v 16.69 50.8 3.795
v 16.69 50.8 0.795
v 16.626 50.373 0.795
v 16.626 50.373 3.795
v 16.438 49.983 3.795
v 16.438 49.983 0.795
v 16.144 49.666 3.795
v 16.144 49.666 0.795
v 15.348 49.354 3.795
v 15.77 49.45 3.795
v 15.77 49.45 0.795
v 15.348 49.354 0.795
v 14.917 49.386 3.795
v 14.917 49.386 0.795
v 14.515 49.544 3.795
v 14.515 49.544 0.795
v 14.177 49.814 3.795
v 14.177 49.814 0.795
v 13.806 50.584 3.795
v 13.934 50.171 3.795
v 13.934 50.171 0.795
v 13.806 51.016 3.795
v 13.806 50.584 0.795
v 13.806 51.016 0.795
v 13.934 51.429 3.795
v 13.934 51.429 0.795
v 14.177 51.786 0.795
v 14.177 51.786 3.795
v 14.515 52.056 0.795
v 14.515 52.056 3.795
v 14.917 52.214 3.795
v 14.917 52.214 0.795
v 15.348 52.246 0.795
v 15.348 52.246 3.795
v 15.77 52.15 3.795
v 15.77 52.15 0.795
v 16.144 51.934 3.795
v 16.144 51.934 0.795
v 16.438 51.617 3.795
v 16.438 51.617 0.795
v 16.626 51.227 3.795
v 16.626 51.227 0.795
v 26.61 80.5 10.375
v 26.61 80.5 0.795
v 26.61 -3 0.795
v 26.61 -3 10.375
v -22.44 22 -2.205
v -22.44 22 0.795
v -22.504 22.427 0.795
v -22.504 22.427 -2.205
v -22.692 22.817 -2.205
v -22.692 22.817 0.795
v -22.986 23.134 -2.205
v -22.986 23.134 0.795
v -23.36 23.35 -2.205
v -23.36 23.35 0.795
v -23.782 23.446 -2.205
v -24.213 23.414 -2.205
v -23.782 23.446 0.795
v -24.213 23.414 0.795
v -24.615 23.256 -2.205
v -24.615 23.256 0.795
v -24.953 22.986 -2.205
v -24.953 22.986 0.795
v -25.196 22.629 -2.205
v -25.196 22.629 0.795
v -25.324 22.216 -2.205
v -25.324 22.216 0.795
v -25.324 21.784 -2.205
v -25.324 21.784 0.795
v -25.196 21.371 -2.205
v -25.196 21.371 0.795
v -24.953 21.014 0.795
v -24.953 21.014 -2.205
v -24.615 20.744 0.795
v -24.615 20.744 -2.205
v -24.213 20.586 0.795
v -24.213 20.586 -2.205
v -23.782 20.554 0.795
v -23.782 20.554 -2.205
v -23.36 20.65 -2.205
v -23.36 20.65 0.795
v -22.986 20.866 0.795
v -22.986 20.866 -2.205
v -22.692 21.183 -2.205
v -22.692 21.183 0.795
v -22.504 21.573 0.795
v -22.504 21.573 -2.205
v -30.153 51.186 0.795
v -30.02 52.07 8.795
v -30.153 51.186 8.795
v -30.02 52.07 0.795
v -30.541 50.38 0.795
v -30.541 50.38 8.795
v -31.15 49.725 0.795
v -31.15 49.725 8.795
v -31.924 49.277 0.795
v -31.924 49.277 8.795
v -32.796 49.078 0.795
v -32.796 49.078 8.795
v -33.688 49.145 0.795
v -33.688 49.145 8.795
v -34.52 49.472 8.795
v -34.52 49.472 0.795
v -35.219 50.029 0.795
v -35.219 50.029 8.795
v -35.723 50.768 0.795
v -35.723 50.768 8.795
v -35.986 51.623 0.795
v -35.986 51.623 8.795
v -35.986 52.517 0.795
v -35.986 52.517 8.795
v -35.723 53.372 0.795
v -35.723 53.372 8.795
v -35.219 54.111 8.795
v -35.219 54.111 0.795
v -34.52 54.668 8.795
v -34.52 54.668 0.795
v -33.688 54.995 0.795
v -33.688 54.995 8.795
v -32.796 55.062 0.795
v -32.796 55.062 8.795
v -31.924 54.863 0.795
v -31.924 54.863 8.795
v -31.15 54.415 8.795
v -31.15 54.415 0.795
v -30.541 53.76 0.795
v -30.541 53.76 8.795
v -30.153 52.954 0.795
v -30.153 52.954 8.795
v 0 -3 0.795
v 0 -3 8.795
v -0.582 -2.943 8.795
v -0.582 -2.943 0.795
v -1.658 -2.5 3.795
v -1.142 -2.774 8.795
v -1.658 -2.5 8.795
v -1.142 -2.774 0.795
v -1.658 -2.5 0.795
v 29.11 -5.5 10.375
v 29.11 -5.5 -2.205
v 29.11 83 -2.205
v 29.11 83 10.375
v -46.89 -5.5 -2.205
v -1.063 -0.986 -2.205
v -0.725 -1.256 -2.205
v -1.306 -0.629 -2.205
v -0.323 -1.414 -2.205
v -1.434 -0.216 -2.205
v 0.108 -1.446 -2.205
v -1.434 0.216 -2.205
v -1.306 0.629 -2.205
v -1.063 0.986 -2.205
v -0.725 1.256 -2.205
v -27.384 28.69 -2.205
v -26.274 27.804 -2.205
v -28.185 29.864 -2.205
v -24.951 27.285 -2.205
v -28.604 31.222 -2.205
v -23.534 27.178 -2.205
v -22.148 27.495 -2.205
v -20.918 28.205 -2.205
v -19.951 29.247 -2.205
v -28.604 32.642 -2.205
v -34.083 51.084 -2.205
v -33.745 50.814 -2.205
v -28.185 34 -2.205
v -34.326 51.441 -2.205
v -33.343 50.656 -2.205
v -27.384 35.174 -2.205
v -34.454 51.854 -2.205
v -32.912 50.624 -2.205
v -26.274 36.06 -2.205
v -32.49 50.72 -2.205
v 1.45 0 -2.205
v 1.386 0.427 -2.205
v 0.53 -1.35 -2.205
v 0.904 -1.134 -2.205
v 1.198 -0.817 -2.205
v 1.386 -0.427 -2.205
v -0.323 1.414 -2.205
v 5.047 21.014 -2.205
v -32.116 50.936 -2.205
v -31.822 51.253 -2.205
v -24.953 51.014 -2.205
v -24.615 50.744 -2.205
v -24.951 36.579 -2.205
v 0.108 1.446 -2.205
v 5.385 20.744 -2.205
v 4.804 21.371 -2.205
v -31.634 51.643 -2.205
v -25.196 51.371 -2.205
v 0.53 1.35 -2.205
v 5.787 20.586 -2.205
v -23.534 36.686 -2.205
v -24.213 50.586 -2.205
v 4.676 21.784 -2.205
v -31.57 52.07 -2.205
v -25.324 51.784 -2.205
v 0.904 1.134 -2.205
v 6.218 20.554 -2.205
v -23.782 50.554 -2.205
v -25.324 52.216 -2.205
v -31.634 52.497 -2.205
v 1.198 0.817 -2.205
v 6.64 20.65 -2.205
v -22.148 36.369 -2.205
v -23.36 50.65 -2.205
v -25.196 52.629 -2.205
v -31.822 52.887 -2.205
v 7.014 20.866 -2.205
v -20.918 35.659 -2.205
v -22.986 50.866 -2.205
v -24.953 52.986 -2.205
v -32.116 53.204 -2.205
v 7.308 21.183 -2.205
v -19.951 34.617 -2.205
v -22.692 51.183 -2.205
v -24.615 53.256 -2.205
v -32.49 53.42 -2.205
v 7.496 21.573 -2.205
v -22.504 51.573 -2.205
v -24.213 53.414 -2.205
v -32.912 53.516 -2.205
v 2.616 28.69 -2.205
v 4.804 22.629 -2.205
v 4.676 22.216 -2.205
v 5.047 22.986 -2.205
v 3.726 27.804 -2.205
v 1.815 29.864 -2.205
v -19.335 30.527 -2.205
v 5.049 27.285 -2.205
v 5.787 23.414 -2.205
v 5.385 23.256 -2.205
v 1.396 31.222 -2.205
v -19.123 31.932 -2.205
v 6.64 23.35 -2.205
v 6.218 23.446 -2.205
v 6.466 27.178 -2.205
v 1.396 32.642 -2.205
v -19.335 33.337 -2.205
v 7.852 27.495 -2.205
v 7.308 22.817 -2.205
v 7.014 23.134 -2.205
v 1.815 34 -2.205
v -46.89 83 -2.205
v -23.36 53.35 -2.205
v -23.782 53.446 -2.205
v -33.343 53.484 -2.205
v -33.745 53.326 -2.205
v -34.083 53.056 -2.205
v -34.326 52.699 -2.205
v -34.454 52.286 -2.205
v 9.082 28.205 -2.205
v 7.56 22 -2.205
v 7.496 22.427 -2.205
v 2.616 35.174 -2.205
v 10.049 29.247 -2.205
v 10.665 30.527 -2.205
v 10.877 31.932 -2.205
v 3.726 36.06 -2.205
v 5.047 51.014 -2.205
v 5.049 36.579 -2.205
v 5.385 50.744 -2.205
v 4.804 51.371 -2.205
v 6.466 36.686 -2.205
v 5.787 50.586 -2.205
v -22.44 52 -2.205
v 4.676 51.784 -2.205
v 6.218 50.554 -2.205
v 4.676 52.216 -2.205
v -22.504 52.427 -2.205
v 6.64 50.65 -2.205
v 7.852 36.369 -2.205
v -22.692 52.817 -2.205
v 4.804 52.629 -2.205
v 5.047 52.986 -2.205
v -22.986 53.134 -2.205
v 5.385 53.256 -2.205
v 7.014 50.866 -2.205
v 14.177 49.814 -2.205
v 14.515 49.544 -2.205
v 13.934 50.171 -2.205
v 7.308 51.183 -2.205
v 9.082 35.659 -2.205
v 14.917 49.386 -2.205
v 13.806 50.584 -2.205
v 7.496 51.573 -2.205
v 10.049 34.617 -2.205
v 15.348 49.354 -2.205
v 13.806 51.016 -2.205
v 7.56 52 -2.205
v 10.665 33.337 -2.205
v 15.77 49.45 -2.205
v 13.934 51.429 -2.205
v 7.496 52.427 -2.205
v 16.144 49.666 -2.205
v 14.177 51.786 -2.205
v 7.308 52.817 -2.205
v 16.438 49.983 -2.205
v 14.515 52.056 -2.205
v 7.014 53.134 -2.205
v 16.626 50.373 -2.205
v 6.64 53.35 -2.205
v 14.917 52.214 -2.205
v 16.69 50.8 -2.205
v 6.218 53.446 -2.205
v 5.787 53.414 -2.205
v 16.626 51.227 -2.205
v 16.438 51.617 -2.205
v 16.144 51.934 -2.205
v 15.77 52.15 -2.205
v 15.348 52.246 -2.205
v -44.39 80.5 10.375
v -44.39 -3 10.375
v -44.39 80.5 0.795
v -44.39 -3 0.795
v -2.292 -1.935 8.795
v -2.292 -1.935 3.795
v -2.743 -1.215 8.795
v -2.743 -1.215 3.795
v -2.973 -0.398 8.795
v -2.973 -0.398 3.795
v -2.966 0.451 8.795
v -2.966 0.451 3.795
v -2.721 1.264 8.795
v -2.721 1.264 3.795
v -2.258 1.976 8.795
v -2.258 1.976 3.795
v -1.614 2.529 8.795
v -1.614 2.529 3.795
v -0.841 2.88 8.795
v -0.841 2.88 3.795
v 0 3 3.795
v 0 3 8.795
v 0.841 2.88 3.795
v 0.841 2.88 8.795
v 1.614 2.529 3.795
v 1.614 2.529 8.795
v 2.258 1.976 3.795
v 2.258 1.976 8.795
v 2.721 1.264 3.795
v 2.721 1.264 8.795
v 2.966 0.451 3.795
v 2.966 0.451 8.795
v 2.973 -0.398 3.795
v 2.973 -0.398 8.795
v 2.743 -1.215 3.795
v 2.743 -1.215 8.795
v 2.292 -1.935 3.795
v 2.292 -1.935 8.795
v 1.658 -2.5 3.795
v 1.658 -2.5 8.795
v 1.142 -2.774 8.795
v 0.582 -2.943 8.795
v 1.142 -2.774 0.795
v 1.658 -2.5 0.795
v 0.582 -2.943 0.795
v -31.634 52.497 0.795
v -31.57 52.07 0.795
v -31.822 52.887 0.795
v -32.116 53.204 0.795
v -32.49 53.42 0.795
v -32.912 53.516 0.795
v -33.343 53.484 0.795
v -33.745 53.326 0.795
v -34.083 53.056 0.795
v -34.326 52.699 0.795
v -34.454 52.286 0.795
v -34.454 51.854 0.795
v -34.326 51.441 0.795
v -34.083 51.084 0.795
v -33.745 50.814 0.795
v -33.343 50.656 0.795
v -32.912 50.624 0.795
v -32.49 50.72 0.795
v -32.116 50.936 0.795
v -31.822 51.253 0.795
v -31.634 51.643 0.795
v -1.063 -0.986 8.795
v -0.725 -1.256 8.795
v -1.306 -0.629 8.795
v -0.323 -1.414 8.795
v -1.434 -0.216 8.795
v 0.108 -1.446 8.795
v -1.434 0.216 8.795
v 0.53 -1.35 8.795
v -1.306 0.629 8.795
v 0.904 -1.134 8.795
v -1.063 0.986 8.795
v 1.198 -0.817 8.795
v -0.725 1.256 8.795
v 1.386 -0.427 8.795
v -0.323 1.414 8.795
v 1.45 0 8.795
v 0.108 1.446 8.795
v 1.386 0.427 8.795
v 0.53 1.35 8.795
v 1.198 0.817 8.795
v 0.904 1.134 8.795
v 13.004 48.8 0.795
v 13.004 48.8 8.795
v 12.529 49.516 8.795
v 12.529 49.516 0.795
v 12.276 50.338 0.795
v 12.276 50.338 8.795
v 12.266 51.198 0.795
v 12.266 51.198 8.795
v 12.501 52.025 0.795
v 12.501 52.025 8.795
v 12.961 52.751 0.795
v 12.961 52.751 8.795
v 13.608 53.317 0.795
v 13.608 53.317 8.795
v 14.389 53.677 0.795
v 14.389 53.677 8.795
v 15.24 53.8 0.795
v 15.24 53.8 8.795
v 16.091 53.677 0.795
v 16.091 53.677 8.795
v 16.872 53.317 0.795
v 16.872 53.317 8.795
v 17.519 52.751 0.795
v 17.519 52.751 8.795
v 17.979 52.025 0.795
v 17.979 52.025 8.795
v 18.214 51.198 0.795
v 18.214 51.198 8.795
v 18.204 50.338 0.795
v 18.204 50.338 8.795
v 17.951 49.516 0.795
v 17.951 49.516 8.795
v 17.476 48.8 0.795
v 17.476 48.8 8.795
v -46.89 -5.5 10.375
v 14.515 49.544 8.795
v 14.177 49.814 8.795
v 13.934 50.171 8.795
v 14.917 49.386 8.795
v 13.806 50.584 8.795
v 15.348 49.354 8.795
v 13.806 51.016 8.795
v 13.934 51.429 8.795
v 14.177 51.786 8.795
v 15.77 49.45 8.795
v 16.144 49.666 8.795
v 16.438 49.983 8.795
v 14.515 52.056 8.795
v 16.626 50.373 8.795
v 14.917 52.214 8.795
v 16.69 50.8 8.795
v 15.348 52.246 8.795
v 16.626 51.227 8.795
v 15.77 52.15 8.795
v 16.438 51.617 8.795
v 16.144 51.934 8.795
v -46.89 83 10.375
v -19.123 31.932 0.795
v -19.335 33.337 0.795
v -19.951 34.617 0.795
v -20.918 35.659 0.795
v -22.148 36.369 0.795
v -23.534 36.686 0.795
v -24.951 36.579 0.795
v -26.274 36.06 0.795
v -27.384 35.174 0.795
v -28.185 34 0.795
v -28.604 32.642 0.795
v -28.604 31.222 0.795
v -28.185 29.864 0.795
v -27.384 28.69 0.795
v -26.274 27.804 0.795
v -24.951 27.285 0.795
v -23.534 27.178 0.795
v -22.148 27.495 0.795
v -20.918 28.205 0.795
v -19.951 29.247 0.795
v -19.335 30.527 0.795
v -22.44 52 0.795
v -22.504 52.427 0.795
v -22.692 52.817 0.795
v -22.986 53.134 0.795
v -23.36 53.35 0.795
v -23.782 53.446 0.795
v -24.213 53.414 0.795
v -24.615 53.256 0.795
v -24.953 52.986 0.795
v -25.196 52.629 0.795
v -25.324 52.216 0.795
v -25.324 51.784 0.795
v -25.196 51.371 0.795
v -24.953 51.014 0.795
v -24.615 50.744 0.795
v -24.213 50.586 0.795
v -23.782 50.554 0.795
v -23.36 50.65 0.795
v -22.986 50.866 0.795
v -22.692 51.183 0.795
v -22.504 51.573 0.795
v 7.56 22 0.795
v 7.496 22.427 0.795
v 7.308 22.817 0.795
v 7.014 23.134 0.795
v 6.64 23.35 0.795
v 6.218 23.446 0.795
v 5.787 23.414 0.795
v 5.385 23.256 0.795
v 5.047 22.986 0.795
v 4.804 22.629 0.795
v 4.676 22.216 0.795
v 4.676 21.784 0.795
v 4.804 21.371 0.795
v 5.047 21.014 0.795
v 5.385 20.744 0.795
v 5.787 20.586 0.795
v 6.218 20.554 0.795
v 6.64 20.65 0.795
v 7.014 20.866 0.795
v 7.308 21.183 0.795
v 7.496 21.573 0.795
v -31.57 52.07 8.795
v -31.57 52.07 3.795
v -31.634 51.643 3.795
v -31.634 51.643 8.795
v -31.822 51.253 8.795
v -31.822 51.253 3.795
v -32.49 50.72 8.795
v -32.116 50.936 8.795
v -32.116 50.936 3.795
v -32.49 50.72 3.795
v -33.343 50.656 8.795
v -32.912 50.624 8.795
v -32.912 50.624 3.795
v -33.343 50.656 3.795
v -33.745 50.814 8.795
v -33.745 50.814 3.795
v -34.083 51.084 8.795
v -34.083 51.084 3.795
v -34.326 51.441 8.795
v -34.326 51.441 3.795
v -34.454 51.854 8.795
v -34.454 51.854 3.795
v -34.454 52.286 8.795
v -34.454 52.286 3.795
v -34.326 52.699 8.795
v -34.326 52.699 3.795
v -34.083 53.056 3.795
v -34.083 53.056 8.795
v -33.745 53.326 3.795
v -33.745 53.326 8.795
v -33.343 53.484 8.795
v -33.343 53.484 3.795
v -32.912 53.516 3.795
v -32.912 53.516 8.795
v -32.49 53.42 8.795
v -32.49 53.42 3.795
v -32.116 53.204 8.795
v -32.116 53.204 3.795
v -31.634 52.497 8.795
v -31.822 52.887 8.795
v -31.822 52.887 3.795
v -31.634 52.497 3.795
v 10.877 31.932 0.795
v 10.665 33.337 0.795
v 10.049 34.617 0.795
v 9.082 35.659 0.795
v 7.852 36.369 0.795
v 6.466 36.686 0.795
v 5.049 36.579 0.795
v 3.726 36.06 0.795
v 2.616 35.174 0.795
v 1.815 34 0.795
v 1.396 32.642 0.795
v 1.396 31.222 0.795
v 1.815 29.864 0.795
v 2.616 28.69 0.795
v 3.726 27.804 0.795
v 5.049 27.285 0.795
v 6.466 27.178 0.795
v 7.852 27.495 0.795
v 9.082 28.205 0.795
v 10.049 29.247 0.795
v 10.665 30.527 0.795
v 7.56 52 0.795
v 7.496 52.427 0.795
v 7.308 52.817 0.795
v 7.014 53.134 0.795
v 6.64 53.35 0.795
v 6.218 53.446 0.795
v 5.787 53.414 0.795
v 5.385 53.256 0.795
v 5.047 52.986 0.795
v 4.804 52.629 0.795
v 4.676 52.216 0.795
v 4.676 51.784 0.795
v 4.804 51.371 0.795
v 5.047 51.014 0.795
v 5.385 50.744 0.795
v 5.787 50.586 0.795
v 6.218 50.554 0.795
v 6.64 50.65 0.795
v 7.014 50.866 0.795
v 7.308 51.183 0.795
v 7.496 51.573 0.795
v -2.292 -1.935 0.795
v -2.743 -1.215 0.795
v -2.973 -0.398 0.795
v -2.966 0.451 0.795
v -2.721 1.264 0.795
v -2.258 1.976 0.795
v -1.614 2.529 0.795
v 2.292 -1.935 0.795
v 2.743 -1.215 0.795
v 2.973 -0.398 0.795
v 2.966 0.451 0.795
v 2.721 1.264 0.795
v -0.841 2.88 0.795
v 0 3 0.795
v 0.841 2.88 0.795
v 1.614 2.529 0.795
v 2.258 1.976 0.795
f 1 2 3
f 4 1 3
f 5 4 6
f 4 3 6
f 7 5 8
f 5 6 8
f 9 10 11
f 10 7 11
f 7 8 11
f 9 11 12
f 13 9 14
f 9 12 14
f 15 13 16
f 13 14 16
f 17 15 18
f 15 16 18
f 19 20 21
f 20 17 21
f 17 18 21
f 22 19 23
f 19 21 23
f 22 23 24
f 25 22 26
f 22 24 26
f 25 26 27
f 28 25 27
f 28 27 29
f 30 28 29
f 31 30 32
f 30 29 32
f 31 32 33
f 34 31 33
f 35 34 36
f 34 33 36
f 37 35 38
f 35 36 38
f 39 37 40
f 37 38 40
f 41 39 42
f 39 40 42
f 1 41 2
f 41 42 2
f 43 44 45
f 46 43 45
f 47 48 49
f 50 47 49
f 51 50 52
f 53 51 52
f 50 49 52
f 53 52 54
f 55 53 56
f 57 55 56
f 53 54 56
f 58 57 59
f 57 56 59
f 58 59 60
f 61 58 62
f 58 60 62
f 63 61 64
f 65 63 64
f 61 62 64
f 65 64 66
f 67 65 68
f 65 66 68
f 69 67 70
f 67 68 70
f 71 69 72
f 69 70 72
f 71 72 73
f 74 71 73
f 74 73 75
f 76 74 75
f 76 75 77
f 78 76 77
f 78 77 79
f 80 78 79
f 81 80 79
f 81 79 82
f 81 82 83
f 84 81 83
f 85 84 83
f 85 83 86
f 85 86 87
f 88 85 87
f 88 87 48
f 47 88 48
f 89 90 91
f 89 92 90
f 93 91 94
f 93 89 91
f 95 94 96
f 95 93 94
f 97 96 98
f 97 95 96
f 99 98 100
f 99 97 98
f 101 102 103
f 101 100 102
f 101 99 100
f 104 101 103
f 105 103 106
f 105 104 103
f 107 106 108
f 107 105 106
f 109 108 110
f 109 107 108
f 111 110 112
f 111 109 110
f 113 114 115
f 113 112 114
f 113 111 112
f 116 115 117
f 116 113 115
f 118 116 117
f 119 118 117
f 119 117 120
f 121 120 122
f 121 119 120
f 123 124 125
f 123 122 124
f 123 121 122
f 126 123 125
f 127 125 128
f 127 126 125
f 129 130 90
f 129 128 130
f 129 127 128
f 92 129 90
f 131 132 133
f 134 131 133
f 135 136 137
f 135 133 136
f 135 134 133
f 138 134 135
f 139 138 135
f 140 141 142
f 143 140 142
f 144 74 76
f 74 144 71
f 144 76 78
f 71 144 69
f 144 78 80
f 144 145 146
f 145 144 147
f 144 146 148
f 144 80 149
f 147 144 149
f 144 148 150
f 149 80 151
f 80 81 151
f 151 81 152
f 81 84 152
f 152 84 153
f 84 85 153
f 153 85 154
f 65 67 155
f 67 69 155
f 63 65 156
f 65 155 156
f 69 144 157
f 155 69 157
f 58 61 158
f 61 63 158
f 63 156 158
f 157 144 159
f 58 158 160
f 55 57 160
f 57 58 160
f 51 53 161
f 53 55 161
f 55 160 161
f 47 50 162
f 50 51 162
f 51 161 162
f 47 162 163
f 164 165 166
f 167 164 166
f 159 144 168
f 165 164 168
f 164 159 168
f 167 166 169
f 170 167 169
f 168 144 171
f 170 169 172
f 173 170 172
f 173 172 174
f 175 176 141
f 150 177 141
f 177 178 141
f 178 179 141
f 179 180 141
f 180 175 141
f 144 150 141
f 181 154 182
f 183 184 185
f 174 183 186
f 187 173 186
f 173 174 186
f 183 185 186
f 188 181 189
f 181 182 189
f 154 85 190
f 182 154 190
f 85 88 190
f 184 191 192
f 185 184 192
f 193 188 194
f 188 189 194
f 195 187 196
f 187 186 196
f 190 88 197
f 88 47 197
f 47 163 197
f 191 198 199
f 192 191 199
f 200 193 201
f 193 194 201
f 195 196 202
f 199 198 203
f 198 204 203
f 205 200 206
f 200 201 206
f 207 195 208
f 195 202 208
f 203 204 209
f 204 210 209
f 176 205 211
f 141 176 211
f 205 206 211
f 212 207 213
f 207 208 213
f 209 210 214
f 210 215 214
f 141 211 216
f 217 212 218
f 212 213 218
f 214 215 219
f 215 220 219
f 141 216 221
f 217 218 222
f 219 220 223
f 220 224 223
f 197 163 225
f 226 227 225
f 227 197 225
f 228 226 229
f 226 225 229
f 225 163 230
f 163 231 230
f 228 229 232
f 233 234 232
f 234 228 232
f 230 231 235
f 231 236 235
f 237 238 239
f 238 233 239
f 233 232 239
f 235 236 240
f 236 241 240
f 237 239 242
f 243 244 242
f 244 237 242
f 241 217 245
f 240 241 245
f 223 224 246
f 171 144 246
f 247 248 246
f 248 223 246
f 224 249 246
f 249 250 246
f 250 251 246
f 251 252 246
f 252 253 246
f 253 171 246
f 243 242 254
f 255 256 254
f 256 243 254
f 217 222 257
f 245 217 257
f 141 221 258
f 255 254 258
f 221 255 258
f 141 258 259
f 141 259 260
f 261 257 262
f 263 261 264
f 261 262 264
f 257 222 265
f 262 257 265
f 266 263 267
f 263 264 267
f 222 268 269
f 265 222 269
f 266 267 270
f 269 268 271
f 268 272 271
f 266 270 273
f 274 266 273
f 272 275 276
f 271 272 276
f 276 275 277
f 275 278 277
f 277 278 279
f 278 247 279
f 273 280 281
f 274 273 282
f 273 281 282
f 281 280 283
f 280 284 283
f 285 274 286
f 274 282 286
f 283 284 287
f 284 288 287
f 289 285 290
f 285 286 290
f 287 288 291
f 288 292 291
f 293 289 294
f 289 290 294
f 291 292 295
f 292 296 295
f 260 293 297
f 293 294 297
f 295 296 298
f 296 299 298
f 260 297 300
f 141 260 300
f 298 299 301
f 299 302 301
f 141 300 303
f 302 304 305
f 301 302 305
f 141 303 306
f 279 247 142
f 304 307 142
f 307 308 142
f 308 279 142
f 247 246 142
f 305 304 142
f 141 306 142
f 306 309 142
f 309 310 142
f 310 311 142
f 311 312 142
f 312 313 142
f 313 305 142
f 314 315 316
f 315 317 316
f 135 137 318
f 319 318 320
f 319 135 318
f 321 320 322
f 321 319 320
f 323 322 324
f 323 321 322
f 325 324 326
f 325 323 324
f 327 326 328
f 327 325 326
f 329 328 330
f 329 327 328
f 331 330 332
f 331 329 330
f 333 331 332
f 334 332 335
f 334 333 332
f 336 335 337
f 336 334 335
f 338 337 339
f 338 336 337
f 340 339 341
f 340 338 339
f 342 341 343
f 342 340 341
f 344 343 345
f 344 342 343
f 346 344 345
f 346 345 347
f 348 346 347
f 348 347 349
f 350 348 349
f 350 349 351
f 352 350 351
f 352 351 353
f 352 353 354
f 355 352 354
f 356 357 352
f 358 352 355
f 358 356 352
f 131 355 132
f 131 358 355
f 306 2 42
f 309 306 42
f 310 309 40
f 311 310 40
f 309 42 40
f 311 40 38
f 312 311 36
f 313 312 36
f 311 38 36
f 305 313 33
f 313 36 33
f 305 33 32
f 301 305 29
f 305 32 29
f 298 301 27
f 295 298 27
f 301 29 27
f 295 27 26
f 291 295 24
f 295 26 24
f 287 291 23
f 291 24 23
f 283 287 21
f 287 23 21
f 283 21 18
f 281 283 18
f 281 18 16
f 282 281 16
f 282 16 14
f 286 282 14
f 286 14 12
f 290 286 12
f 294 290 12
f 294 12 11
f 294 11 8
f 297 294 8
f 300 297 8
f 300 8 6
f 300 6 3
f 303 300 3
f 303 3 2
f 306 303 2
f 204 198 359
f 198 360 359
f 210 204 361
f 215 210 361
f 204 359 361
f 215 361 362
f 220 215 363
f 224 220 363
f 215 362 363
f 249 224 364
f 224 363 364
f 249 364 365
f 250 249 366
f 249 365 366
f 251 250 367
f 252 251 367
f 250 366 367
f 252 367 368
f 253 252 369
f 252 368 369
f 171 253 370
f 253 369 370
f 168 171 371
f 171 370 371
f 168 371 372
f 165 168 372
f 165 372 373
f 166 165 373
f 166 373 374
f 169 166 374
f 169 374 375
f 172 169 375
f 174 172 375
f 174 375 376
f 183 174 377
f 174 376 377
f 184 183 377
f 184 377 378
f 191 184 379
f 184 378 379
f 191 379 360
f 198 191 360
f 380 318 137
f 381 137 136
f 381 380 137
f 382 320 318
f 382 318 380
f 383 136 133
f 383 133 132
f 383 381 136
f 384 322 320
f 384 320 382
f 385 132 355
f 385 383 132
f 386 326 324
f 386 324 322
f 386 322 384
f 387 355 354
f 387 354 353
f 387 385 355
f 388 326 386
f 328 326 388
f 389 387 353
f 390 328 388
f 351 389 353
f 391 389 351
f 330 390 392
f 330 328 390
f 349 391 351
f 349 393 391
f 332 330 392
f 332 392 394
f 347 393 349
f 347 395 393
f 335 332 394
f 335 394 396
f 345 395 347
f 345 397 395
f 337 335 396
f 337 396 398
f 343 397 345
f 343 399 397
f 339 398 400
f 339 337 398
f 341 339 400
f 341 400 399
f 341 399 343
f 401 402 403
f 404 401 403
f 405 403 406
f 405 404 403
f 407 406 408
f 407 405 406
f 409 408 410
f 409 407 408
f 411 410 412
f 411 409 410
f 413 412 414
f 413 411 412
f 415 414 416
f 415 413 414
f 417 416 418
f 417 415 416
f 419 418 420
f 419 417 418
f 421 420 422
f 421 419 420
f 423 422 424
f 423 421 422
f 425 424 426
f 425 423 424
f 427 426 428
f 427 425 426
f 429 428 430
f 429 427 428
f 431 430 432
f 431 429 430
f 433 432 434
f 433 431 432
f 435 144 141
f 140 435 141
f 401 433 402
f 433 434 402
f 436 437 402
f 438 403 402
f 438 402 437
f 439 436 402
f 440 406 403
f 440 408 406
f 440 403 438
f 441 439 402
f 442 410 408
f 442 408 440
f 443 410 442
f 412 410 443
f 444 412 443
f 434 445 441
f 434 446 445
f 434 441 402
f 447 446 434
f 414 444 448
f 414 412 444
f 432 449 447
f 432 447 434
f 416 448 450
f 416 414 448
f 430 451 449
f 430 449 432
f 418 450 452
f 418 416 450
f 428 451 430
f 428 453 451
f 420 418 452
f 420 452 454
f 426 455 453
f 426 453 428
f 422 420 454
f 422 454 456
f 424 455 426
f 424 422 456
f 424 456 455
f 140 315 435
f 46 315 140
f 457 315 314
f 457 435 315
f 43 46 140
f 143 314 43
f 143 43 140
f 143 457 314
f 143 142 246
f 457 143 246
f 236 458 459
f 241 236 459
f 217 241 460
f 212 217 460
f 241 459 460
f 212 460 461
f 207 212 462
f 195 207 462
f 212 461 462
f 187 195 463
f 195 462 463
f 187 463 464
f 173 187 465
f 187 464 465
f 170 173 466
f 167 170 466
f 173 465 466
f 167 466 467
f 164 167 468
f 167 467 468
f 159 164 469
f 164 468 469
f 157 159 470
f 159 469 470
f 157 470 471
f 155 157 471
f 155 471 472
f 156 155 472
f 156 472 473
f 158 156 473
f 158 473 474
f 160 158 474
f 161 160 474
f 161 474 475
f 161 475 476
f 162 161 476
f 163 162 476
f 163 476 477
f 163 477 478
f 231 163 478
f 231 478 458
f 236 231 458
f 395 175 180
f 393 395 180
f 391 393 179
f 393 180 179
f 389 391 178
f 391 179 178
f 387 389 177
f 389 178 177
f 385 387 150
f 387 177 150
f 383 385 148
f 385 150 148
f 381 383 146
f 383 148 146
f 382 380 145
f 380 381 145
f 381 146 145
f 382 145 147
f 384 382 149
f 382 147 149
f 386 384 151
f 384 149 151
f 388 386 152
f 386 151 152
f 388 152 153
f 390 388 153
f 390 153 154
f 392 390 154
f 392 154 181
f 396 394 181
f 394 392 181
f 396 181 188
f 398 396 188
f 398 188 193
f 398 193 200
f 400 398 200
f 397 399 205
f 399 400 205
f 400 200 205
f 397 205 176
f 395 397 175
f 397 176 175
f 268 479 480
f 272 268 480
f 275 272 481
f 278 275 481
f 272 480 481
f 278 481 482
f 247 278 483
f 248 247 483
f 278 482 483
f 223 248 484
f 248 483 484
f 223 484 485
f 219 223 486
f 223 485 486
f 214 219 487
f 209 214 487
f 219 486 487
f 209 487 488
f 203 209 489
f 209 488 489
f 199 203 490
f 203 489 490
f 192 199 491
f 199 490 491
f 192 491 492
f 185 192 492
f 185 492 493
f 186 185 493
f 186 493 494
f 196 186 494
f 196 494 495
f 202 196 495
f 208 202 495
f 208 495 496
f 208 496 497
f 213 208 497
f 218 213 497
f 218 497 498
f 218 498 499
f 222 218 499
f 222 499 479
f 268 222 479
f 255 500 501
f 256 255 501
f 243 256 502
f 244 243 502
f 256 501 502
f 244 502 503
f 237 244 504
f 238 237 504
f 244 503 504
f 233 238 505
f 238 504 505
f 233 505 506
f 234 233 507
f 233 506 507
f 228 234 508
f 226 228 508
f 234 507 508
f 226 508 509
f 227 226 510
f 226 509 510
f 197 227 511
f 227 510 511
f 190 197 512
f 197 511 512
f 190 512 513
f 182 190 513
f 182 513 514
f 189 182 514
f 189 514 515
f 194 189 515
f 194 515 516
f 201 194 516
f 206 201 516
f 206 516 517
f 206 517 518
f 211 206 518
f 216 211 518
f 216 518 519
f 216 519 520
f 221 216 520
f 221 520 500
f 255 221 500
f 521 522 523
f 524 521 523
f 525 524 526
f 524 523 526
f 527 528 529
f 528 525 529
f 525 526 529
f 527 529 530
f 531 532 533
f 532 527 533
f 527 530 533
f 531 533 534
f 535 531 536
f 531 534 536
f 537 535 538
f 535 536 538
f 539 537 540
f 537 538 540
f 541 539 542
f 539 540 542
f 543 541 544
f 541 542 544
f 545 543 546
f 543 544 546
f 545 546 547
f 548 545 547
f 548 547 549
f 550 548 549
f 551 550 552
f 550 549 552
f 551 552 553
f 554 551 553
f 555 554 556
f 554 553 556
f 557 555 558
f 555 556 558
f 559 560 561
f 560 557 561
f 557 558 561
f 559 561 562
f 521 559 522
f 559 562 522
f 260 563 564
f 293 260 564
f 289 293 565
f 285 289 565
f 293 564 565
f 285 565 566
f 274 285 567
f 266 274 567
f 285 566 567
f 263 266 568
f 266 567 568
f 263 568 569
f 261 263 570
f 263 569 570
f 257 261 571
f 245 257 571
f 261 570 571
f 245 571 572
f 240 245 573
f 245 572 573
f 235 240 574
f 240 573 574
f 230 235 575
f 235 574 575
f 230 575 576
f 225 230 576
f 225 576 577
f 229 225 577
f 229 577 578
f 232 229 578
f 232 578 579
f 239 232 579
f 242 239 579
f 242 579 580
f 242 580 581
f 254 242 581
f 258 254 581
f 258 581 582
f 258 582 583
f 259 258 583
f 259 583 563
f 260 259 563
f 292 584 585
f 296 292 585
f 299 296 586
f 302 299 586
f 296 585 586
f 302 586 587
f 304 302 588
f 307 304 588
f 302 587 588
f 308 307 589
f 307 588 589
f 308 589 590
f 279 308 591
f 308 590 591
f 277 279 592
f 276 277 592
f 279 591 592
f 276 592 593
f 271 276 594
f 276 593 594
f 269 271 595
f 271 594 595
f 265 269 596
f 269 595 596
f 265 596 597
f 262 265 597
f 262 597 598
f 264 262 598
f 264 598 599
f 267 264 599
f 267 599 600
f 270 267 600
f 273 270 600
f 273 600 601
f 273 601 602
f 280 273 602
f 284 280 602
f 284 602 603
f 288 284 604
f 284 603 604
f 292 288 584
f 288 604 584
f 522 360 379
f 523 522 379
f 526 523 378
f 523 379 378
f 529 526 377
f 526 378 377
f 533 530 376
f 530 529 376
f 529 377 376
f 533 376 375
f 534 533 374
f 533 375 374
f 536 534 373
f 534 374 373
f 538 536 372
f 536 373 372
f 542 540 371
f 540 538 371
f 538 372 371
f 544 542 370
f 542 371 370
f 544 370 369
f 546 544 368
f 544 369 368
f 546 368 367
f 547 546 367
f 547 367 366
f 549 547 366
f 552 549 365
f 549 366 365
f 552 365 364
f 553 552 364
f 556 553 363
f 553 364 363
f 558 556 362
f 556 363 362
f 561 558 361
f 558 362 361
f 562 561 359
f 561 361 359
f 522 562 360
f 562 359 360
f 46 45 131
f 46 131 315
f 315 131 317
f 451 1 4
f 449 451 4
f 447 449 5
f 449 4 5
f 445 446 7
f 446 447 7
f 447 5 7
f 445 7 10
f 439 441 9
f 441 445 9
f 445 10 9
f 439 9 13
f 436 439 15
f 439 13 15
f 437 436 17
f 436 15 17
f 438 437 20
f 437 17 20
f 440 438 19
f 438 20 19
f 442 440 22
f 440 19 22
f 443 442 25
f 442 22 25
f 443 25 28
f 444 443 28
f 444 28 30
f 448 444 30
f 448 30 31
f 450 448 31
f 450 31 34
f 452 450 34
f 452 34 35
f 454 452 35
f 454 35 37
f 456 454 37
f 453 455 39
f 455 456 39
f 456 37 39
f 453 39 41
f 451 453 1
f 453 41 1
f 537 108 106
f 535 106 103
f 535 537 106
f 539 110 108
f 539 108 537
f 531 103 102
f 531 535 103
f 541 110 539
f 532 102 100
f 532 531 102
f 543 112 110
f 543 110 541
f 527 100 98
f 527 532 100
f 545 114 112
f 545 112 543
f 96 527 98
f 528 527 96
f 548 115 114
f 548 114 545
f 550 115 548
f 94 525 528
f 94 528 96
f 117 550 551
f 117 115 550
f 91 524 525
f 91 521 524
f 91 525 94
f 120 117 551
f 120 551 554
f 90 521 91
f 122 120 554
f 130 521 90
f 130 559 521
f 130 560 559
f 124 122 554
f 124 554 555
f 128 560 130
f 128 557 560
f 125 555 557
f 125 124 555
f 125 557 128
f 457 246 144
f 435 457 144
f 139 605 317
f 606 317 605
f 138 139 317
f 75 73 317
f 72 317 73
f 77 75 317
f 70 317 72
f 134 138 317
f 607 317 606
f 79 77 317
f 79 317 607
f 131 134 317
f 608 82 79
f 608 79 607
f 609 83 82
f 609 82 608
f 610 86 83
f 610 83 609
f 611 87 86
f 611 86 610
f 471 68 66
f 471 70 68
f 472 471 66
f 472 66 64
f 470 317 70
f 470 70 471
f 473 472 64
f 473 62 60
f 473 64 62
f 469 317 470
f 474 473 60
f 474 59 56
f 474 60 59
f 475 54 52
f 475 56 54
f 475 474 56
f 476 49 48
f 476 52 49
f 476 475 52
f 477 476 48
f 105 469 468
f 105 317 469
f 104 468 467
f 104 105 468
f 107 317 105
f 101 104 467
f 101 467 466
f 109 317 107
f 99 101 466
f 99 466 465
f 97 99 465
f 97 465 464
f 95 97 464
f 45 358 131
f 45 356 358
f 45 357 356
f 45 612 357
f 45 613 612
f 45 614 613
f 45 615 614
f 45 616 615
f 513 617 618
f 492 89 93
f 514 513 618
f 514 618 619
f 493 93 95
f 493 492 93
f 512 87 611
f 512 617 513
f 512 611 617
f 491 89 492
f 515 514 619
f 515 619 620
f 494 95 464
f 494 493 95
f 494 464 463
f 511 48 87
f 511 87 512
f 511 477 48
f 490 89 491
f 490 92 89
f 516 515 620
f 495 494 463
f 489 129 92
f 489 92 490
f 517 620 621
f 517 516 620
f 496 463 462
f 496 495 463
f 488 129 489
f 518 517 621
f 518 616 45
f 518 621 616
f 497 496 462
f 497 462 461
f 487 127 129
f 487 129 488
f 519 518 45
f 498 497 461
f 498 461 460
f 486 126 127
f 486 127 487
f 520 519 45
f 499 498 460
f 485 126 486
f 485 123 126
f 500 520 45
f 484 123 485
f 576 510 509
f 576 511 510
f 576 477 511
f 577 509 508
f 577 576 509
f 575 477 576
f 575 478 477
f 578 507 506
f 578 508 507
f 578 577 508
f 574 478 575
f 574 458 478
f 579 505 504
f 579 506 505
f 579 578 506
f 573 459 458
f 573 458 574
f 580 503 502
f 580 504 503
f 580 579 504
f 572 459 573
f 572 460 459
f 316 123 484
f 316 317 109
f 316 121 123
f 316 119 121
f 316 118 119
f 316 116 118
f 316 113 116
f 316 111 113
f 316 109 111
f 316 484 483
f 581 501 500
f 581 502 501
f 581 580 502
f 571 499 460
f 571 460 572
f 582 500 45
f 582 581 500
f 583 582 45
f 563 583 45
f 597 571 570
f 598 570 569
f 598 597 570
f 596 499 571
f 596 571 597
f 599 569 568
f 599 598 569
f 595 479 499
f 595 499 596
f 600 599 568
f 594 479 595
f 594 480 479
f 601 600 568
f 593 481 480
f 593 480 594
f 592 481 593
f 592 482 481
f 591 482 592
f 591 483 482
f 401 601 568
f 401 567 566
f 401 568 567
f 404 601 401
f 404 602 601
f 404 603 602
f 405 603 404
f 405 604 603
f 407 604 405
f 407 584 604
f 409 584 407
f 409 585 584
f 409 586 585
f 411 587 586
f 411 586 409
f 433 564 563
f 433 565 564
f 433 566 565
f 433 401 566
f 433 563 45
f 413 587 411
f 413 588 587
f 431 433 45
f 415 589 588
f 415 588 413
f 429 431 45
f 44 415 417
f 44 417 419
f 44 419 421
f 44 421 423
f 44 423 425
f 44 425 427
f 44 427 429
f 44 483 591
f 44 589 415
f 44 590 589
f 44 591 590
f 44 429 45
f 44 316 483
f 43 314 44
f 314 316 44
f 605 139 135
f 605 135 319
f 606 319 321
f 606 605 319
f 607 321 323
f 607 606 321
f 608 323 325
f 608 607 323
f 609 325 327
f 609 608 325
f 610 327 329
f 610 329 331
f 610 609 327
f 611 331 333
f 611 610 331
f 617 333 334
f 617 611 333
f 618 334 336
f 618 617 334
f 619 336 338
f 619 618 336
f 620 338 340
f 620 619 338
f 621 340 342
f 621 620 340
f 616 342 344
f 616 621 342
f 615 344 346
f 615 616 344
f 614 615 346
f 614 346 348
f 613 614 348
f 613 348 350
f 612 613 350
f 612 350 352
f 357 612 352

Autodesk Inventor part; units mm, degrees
ref_plane "YZ Plane" through (0, 0, 0) normal (1, 0, 0) x (0, 1, 0)
ref_plane "XZ Plane" through (0, 0, 0) normal (0, 1, 0) x (-1, 0, 0)
ref_plane "Work Plane1" through (-41.89, 79.898, 0.7952) normal (0, 0, 1) x (1, 0, 0)
sketch "Sketch1" plane through (-41.89, 79.898, 0.7952) normal (0, 0, 1) x (1, 0, 0)
  circle A0 centre (41.89, -79.898) radius 1.45
  circle A1 centre (8.87, -27.828) radius 1.45
  circle A2 centre (57.13, -29.098) radius 1.45
  arc A3 (66, -80.398) -> (68, -78.398) centre (66, -78.398) ccw projected
  line L0 (66, 0.102) -> (0, 0.102) projected
  line L1 (-2, -1.898) -> (-2, -24.398) projected
  line L2 (-2, 0.102) -> (68, 0.102)
  line L3 (68, 0.102) -> (68, -82.398)
  line L4 (68, -82.398) -> (-2, -82.398)
  line L5 (-2, -82.398) -> (-2, 0.102)
  line L6 (-2, 3.102) -> (-5, 3.102)
  line L7 (68, -85.398) -> (71, -85.398)
  line L8 (-5, 3.102) -> (71, 3.102)
  line L9 (71, 3.102) -> (71, -85.398)
  line L10 (71, -85.398) -> (-5, -85.398)
  line L11 (-5, -85.398) -> (-5, 3.102)
  point P0 (44.5, -82.398)
  point P1 (-2, 3.102)
  point P2 (-2, -24.398)
  point P3 (-2, -1.898)
  point P4 (66, 0.102)
  dimension "d0" = 2.9
  dimension "d1" = 2.9
  dimension "d2" = 2.9
extrude "Extrusion1" add sketch "Sketch1" against normal blind 3 contours L2 L3 L4 L5 L1 L0 | L8 L9 L7 L10 L11 L6
sketch "Sketch2" plane through (-41.89, 79.898, 0.7952) normal (0, 0, 1) x (1, 0, 0)
  circle A0 centre (8.87, -27.828) radius 1.45 projected
  circle A1 centre (8.87, -27.828) radius 3
  circle A2 centre (57.13, -29.098) radius 1.45 projected
  circle A3 centre (57.13, -29.098) radius 3
  circle A4 centre (41.89, -79.898) radius 3
  circle A5 centre (41.89, -79.898) radius 1.45
  dimension "d9" = 6
  dimension "d10" = 6
  dimension "d11" = 6
extrude "Extrusion2" add sketch "Sketch2" along normal blind 3
sketch "Sketch3" plane through (-41.89, 79.898, 0.7952) normal (0, 0, 1) x (1, 0, 0)
  line L0 (71, -85.398) -> (-5, -85.398) projected
  circle A0 centre (18, -27.898) radius 1.45
  circle A1 centre (48, -27.898) radius 1.45
  circle A2 centre (18, -57.898) radius 1.45
  circle A3 centre (48, -57.898) radius 1.45
  point P0 (41.89, -79.898)
  dimension "d19" = 2.9
  dimension "d20" = 2.9
  dimension "d21" = 2.9
  dimension "d22" = 2.9
extrude "Extrusion3" cut sketch "Sketch3" against normal up to surface (3 mm away)
extrude "Extrusion5" add sketch "Sketch1" along normal blind 4.58 contours L8 L9 L7 L10 L11 L6
sketch "Sketch5" plane through (-41.89, 79.898, 5.3752) normal (0, 0, 1) x (1, 0, 0)
  line L0 (-2, 0.102) -> (-2, -82.398) projected
  line L1 (-2, -82.898) -> (68, -82.898)
  line L2 (43.5483, -82.398) -> (68, -82.398) projected
  line L3 (68, -82.898) -> (68.5, -82.898)
  line L4 (68.5, -82.898) -> (68.5, 0.102)
  line L5 (68, -82.398) -> (68, 0.102) projected
  line L6 (68.5, 0.102) -> (68.5, 0.602)
  line L7 (68.5, 0.602) -> (-2, 0.602)
  line L8 (-2, 0.602) -> (-2.5, 0.602)
  line L9 (-2.5, 0.602) -> (-2.5, -82.898)
  line L10 (-2.5, -82.898) -> (-2, -82.898)
  line L11 (-2, -82.398) -> (-2, 0.102) projected
  line L12 (68, -82.398) -> (-2, -82.398) projected
  line L13 (68, 0.102) -> (68, -82.398) projected
  line L14 (-2, 0.102) -> (68, 0.102) projected
  point P0 (41.89, -79.898)
  dimension "d33" = 0.5
  dimension "d34" = 0.5
  dimension "d35" = 0.5
  dimension "d36" = 0.5
extrude "Extrusion6" cut sketch "Sketch5" against normal up to surface (4.58 mm away)
sketch "Sketch6" plane through (-41.89, 79.898, 0.7952) normal (0, 0, 1) x (1, 0, 0)
  circle A0 centre (48, -57.898) radius 1.45 projected
  circle A1 centre (18, -57.898) radius 1.45 projected
  circle A2 centre (48, -47.966) radius 4.767
  circle A3 centre (18, -47.966) radius 4.767
  point P0 (41.89, -79.898)
  dimension "d40" = 9.534
extrude "Extrusion7" cut sketch "Sketch6" against normal up to surface (3 mm away) contours A2 | A3
sketch "Sketch7" plane through (15.24, 50.8, 3.7952) normal (0, 0, 1) x (1, 0, 0)
  line L0 (-16.8983, -53.3) -> (-13.5817, -53.3) projected
  arc A0 (-13.5817, -53.3) -> (-16.8983, -53.3) centre (-15.24, -50.8) ccw projected
  circle A1 centre (-15.24, -50.8) radius 1.45 projected
  circle A2 centre (-48.26, 1.27) radius 3 projected
  circle A3 centre (-48.26, 1.27) radius 1.45 projected
  circle A4 centre (0, 0) radius 3 projected
  circle A5 centre (0, 0) radius 1.45 projected
  point P0 (-15.24, -50.8)
extrude "Extrusion8" add sketch "Sketch7" along normal blind 5
sketch "Sketch8" plane through (-41.89, 79.898, 5.3752) normal (0, 0, 1) x (1, 0, 0)
  line L0 (68.5, -82.898) -> (-2.5, -82.898) projected
  line L1 (-2.5, -82.898) -> (-2.5, 0.602) projected
  line L2 (-2.5, 0.602) -> (68.5, 0.602) projected
  line L3 (68.5, 0.602) -> (68.5, -82.898) projected
  line L4 (71, 3.102) -> (-5, 3.102) projected
  line L5 (-5, 3.102) -> (-5, -85.398) projected
  line L6 (-5, -85.398) -> (71, -85.398) projected
  line L7 (71, -85.398) -> (71, 3.102) projected
  point P0 (41.89, -79.898)
extrude "Extrusion9" add sketch "Sketch8" along normal blind 5
sketch "Sketch9" plane through (15.24, 50.8, 8.7952) normal (0, 0, 1) x (1, 0, 0)
  circle A0 centre (0, 0) radius 1.45 projected
  circle A1 centre (0, 0) radius 3 projected
  line L0 (0, 0) -> (0, -2)
  line L1 (0, -2) -> (2.2361, -2)
  line L2 (0, -2) -> (-2.2361, -2)
  point P0 (-15.24, -50.8)
  dimension "d47" = 2
extrude "Extrusion10" cut sketch "Sketch9" against normal up to surface (8 mm away) contours L1 A1 L2 picked at (1.3106, -2.1582)
sketch "Sketch10" plane through (-41.89, 79.898, 0.7952) normal (0, 0, 1) x (1, 0, 0)
  arc A0 (43.5483, -82.398) -> (40.2317, -82.398) centre (41.89, -79.898) ccw projected
  circle A1 centre (41.89, -79.898) radius 3
  circle A2 centre (41.89, -79.898) radius 1.45 projected
  circle A3 centre (41.89, -79.898) radius 1.45
  point P0 (41.89, -79.898)
  point P1 (40.2317, -82.398)
extrude "Extrusion11" add sketch "Sketch10" along normal up to surface (8 mm away)
properties part number "nucleo_din_connector"
